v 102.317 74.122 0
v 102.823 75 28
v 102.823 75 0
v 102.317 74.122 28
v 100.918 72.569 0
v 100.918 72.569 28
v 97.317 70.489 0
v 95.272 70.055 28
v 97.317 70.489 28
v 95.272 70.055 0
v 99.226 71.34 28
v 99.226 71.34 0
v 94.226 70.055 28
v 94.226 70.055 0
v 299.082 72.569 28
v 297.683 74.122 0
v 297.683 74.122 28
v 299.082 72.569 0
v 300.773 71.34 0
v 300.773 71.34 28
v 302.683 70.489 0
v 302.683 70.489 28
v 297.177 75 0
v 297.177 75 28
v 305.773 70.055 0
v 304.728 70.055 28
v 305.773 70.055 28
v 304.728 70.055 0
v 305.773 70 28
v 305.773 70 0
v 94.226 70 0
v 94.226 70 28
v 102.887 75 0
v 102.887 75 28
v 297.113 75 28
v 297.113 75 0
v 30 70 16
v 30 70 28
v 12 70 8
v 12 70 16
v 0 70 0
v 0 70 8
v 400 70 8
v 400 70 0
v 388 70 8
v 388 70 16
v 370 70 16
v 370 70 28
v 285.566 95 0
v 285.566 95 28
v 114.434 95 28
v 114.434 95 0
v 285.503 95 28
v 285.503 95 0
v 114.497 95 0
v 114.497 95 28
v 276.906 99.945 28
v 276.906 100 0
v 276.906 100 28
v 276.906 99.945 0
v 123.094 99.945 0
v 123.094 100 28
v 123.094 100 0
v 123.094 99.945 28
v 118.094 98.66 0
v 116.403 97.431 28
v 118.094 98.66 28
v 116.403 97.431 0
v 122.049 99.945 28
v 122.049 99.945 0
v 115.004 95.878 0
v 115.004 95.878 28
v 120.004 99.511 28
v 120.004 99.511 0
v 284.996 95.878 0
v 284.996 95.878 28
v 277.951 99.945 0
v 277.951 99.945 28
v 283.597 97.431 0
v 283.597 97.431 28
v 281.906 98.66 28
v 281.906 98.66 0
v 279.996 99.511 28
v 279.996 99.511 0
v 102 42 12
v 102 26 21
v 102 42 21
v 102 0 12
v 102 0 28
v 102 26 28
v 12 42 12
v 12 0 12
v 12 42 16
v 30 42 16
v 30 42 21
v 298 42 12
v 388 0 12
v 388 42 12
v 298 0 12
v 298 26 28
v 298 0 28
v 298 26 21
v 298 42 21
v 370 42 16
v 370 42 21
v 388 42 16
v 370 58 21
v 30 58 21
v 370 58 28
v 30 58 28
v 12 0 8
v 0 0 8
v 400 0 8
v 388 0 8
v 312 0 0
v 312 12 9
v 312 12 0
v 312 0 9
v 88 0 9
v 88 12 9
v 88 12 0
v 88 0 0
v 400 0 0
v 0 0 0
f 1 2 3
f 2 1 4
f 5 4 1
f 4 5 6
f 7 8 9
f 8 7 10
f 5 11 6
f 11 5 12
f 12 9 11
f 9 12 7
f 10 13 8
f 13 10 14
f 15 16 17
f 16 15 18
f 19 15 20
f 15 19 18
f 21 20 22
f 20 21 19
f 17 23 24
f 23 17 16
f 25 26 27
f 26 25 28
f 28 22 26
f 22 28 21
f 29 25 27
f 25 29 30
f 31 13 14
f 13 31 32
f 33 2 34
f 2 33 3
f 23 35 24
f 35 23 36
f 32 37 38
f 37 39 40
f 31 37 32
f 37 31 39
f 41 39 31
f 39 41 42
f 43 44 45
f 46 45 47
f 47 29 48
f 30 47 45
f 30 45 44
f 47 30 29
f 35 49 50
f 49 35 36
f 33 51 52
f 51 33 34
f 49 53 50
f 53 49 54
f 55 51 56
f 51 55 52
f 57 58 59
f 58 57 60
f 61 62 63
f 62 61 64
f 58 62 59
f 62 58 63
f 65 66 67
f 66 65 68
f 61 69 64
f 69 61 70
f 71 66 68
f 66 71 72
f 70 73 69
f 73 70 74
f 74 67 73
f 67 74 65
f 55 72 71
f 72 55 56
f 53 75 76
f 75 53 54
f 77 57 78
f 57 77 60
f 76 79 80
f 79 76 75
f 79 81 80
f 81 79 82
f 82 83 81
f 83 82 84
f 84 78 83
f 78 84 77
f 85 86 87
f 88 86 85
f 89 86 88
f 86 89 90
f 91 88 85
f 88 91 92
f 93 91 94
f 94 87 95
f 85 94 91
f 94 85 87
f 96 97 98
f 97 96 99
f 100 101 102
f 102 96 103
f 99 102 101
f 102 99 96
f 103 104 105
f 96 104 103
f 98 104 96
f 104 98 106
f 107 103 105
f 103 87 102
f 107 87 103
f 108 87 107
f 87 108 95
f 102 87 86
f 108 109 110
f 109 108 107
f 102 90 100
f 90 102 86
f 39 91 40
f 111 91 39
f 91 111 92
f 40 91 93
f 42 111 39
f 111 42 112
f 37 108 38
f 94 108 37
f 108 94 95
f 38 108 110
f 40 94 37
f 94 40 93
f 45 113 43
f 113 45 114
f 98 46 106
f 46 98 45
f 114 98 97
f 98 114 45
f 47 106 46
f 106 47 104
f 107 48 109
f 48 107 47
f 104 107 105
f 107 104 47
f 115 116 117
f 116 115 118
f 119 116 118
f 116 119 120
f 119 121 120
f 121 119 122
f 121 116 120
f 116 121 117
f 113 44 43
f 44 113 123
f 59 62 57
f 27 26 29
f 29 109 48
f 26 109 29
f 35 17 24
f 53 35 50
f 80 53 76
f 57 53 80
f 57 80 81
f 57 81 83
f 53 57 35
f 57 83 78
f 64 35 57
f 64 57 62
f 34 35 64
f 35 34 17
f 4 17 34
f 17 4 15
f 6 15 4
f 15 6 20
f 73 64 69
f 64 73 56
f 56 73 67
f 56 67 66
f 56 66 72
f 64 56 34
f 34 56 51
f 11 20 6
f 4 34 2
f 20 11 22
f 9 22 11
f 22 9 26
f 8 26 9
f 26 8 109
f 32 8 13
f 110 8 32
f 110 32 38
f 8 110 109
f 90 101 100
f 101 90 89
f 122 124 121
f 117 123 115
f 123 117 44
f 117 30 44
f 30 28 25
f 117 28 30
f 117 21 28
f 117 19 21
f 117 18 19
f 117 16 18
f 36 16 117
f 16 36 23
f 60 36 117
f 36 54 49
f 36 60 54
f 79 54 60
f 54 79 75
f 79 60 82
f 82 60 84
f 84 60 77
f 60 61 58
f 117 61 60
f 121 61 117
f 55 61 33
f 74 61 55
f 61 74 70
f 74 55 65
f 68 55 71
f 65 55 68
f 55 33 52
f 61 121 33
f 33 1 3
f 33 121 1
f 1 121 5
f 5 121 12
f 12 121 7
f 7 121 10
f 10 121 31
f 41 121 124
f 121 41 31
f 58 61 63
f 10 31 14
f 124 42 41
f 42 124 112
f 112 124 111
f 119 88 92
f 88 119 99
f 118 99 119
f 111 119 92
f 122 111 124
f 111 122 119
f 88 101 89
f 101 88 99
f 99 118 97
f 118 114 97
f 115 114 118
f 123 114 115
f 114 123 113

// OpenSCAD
include <../src/wardrobe.scad>;
plank_xz_rear_top(wardrobe_n);
//github_openscad -o wardrobe_2/plank_xz_rear_top.stl -D wardrobe_n=2 -D cutting_edge=0 -D break_view_length=0 wardrobe_2/plank_xz_rear_top_stl.scad
